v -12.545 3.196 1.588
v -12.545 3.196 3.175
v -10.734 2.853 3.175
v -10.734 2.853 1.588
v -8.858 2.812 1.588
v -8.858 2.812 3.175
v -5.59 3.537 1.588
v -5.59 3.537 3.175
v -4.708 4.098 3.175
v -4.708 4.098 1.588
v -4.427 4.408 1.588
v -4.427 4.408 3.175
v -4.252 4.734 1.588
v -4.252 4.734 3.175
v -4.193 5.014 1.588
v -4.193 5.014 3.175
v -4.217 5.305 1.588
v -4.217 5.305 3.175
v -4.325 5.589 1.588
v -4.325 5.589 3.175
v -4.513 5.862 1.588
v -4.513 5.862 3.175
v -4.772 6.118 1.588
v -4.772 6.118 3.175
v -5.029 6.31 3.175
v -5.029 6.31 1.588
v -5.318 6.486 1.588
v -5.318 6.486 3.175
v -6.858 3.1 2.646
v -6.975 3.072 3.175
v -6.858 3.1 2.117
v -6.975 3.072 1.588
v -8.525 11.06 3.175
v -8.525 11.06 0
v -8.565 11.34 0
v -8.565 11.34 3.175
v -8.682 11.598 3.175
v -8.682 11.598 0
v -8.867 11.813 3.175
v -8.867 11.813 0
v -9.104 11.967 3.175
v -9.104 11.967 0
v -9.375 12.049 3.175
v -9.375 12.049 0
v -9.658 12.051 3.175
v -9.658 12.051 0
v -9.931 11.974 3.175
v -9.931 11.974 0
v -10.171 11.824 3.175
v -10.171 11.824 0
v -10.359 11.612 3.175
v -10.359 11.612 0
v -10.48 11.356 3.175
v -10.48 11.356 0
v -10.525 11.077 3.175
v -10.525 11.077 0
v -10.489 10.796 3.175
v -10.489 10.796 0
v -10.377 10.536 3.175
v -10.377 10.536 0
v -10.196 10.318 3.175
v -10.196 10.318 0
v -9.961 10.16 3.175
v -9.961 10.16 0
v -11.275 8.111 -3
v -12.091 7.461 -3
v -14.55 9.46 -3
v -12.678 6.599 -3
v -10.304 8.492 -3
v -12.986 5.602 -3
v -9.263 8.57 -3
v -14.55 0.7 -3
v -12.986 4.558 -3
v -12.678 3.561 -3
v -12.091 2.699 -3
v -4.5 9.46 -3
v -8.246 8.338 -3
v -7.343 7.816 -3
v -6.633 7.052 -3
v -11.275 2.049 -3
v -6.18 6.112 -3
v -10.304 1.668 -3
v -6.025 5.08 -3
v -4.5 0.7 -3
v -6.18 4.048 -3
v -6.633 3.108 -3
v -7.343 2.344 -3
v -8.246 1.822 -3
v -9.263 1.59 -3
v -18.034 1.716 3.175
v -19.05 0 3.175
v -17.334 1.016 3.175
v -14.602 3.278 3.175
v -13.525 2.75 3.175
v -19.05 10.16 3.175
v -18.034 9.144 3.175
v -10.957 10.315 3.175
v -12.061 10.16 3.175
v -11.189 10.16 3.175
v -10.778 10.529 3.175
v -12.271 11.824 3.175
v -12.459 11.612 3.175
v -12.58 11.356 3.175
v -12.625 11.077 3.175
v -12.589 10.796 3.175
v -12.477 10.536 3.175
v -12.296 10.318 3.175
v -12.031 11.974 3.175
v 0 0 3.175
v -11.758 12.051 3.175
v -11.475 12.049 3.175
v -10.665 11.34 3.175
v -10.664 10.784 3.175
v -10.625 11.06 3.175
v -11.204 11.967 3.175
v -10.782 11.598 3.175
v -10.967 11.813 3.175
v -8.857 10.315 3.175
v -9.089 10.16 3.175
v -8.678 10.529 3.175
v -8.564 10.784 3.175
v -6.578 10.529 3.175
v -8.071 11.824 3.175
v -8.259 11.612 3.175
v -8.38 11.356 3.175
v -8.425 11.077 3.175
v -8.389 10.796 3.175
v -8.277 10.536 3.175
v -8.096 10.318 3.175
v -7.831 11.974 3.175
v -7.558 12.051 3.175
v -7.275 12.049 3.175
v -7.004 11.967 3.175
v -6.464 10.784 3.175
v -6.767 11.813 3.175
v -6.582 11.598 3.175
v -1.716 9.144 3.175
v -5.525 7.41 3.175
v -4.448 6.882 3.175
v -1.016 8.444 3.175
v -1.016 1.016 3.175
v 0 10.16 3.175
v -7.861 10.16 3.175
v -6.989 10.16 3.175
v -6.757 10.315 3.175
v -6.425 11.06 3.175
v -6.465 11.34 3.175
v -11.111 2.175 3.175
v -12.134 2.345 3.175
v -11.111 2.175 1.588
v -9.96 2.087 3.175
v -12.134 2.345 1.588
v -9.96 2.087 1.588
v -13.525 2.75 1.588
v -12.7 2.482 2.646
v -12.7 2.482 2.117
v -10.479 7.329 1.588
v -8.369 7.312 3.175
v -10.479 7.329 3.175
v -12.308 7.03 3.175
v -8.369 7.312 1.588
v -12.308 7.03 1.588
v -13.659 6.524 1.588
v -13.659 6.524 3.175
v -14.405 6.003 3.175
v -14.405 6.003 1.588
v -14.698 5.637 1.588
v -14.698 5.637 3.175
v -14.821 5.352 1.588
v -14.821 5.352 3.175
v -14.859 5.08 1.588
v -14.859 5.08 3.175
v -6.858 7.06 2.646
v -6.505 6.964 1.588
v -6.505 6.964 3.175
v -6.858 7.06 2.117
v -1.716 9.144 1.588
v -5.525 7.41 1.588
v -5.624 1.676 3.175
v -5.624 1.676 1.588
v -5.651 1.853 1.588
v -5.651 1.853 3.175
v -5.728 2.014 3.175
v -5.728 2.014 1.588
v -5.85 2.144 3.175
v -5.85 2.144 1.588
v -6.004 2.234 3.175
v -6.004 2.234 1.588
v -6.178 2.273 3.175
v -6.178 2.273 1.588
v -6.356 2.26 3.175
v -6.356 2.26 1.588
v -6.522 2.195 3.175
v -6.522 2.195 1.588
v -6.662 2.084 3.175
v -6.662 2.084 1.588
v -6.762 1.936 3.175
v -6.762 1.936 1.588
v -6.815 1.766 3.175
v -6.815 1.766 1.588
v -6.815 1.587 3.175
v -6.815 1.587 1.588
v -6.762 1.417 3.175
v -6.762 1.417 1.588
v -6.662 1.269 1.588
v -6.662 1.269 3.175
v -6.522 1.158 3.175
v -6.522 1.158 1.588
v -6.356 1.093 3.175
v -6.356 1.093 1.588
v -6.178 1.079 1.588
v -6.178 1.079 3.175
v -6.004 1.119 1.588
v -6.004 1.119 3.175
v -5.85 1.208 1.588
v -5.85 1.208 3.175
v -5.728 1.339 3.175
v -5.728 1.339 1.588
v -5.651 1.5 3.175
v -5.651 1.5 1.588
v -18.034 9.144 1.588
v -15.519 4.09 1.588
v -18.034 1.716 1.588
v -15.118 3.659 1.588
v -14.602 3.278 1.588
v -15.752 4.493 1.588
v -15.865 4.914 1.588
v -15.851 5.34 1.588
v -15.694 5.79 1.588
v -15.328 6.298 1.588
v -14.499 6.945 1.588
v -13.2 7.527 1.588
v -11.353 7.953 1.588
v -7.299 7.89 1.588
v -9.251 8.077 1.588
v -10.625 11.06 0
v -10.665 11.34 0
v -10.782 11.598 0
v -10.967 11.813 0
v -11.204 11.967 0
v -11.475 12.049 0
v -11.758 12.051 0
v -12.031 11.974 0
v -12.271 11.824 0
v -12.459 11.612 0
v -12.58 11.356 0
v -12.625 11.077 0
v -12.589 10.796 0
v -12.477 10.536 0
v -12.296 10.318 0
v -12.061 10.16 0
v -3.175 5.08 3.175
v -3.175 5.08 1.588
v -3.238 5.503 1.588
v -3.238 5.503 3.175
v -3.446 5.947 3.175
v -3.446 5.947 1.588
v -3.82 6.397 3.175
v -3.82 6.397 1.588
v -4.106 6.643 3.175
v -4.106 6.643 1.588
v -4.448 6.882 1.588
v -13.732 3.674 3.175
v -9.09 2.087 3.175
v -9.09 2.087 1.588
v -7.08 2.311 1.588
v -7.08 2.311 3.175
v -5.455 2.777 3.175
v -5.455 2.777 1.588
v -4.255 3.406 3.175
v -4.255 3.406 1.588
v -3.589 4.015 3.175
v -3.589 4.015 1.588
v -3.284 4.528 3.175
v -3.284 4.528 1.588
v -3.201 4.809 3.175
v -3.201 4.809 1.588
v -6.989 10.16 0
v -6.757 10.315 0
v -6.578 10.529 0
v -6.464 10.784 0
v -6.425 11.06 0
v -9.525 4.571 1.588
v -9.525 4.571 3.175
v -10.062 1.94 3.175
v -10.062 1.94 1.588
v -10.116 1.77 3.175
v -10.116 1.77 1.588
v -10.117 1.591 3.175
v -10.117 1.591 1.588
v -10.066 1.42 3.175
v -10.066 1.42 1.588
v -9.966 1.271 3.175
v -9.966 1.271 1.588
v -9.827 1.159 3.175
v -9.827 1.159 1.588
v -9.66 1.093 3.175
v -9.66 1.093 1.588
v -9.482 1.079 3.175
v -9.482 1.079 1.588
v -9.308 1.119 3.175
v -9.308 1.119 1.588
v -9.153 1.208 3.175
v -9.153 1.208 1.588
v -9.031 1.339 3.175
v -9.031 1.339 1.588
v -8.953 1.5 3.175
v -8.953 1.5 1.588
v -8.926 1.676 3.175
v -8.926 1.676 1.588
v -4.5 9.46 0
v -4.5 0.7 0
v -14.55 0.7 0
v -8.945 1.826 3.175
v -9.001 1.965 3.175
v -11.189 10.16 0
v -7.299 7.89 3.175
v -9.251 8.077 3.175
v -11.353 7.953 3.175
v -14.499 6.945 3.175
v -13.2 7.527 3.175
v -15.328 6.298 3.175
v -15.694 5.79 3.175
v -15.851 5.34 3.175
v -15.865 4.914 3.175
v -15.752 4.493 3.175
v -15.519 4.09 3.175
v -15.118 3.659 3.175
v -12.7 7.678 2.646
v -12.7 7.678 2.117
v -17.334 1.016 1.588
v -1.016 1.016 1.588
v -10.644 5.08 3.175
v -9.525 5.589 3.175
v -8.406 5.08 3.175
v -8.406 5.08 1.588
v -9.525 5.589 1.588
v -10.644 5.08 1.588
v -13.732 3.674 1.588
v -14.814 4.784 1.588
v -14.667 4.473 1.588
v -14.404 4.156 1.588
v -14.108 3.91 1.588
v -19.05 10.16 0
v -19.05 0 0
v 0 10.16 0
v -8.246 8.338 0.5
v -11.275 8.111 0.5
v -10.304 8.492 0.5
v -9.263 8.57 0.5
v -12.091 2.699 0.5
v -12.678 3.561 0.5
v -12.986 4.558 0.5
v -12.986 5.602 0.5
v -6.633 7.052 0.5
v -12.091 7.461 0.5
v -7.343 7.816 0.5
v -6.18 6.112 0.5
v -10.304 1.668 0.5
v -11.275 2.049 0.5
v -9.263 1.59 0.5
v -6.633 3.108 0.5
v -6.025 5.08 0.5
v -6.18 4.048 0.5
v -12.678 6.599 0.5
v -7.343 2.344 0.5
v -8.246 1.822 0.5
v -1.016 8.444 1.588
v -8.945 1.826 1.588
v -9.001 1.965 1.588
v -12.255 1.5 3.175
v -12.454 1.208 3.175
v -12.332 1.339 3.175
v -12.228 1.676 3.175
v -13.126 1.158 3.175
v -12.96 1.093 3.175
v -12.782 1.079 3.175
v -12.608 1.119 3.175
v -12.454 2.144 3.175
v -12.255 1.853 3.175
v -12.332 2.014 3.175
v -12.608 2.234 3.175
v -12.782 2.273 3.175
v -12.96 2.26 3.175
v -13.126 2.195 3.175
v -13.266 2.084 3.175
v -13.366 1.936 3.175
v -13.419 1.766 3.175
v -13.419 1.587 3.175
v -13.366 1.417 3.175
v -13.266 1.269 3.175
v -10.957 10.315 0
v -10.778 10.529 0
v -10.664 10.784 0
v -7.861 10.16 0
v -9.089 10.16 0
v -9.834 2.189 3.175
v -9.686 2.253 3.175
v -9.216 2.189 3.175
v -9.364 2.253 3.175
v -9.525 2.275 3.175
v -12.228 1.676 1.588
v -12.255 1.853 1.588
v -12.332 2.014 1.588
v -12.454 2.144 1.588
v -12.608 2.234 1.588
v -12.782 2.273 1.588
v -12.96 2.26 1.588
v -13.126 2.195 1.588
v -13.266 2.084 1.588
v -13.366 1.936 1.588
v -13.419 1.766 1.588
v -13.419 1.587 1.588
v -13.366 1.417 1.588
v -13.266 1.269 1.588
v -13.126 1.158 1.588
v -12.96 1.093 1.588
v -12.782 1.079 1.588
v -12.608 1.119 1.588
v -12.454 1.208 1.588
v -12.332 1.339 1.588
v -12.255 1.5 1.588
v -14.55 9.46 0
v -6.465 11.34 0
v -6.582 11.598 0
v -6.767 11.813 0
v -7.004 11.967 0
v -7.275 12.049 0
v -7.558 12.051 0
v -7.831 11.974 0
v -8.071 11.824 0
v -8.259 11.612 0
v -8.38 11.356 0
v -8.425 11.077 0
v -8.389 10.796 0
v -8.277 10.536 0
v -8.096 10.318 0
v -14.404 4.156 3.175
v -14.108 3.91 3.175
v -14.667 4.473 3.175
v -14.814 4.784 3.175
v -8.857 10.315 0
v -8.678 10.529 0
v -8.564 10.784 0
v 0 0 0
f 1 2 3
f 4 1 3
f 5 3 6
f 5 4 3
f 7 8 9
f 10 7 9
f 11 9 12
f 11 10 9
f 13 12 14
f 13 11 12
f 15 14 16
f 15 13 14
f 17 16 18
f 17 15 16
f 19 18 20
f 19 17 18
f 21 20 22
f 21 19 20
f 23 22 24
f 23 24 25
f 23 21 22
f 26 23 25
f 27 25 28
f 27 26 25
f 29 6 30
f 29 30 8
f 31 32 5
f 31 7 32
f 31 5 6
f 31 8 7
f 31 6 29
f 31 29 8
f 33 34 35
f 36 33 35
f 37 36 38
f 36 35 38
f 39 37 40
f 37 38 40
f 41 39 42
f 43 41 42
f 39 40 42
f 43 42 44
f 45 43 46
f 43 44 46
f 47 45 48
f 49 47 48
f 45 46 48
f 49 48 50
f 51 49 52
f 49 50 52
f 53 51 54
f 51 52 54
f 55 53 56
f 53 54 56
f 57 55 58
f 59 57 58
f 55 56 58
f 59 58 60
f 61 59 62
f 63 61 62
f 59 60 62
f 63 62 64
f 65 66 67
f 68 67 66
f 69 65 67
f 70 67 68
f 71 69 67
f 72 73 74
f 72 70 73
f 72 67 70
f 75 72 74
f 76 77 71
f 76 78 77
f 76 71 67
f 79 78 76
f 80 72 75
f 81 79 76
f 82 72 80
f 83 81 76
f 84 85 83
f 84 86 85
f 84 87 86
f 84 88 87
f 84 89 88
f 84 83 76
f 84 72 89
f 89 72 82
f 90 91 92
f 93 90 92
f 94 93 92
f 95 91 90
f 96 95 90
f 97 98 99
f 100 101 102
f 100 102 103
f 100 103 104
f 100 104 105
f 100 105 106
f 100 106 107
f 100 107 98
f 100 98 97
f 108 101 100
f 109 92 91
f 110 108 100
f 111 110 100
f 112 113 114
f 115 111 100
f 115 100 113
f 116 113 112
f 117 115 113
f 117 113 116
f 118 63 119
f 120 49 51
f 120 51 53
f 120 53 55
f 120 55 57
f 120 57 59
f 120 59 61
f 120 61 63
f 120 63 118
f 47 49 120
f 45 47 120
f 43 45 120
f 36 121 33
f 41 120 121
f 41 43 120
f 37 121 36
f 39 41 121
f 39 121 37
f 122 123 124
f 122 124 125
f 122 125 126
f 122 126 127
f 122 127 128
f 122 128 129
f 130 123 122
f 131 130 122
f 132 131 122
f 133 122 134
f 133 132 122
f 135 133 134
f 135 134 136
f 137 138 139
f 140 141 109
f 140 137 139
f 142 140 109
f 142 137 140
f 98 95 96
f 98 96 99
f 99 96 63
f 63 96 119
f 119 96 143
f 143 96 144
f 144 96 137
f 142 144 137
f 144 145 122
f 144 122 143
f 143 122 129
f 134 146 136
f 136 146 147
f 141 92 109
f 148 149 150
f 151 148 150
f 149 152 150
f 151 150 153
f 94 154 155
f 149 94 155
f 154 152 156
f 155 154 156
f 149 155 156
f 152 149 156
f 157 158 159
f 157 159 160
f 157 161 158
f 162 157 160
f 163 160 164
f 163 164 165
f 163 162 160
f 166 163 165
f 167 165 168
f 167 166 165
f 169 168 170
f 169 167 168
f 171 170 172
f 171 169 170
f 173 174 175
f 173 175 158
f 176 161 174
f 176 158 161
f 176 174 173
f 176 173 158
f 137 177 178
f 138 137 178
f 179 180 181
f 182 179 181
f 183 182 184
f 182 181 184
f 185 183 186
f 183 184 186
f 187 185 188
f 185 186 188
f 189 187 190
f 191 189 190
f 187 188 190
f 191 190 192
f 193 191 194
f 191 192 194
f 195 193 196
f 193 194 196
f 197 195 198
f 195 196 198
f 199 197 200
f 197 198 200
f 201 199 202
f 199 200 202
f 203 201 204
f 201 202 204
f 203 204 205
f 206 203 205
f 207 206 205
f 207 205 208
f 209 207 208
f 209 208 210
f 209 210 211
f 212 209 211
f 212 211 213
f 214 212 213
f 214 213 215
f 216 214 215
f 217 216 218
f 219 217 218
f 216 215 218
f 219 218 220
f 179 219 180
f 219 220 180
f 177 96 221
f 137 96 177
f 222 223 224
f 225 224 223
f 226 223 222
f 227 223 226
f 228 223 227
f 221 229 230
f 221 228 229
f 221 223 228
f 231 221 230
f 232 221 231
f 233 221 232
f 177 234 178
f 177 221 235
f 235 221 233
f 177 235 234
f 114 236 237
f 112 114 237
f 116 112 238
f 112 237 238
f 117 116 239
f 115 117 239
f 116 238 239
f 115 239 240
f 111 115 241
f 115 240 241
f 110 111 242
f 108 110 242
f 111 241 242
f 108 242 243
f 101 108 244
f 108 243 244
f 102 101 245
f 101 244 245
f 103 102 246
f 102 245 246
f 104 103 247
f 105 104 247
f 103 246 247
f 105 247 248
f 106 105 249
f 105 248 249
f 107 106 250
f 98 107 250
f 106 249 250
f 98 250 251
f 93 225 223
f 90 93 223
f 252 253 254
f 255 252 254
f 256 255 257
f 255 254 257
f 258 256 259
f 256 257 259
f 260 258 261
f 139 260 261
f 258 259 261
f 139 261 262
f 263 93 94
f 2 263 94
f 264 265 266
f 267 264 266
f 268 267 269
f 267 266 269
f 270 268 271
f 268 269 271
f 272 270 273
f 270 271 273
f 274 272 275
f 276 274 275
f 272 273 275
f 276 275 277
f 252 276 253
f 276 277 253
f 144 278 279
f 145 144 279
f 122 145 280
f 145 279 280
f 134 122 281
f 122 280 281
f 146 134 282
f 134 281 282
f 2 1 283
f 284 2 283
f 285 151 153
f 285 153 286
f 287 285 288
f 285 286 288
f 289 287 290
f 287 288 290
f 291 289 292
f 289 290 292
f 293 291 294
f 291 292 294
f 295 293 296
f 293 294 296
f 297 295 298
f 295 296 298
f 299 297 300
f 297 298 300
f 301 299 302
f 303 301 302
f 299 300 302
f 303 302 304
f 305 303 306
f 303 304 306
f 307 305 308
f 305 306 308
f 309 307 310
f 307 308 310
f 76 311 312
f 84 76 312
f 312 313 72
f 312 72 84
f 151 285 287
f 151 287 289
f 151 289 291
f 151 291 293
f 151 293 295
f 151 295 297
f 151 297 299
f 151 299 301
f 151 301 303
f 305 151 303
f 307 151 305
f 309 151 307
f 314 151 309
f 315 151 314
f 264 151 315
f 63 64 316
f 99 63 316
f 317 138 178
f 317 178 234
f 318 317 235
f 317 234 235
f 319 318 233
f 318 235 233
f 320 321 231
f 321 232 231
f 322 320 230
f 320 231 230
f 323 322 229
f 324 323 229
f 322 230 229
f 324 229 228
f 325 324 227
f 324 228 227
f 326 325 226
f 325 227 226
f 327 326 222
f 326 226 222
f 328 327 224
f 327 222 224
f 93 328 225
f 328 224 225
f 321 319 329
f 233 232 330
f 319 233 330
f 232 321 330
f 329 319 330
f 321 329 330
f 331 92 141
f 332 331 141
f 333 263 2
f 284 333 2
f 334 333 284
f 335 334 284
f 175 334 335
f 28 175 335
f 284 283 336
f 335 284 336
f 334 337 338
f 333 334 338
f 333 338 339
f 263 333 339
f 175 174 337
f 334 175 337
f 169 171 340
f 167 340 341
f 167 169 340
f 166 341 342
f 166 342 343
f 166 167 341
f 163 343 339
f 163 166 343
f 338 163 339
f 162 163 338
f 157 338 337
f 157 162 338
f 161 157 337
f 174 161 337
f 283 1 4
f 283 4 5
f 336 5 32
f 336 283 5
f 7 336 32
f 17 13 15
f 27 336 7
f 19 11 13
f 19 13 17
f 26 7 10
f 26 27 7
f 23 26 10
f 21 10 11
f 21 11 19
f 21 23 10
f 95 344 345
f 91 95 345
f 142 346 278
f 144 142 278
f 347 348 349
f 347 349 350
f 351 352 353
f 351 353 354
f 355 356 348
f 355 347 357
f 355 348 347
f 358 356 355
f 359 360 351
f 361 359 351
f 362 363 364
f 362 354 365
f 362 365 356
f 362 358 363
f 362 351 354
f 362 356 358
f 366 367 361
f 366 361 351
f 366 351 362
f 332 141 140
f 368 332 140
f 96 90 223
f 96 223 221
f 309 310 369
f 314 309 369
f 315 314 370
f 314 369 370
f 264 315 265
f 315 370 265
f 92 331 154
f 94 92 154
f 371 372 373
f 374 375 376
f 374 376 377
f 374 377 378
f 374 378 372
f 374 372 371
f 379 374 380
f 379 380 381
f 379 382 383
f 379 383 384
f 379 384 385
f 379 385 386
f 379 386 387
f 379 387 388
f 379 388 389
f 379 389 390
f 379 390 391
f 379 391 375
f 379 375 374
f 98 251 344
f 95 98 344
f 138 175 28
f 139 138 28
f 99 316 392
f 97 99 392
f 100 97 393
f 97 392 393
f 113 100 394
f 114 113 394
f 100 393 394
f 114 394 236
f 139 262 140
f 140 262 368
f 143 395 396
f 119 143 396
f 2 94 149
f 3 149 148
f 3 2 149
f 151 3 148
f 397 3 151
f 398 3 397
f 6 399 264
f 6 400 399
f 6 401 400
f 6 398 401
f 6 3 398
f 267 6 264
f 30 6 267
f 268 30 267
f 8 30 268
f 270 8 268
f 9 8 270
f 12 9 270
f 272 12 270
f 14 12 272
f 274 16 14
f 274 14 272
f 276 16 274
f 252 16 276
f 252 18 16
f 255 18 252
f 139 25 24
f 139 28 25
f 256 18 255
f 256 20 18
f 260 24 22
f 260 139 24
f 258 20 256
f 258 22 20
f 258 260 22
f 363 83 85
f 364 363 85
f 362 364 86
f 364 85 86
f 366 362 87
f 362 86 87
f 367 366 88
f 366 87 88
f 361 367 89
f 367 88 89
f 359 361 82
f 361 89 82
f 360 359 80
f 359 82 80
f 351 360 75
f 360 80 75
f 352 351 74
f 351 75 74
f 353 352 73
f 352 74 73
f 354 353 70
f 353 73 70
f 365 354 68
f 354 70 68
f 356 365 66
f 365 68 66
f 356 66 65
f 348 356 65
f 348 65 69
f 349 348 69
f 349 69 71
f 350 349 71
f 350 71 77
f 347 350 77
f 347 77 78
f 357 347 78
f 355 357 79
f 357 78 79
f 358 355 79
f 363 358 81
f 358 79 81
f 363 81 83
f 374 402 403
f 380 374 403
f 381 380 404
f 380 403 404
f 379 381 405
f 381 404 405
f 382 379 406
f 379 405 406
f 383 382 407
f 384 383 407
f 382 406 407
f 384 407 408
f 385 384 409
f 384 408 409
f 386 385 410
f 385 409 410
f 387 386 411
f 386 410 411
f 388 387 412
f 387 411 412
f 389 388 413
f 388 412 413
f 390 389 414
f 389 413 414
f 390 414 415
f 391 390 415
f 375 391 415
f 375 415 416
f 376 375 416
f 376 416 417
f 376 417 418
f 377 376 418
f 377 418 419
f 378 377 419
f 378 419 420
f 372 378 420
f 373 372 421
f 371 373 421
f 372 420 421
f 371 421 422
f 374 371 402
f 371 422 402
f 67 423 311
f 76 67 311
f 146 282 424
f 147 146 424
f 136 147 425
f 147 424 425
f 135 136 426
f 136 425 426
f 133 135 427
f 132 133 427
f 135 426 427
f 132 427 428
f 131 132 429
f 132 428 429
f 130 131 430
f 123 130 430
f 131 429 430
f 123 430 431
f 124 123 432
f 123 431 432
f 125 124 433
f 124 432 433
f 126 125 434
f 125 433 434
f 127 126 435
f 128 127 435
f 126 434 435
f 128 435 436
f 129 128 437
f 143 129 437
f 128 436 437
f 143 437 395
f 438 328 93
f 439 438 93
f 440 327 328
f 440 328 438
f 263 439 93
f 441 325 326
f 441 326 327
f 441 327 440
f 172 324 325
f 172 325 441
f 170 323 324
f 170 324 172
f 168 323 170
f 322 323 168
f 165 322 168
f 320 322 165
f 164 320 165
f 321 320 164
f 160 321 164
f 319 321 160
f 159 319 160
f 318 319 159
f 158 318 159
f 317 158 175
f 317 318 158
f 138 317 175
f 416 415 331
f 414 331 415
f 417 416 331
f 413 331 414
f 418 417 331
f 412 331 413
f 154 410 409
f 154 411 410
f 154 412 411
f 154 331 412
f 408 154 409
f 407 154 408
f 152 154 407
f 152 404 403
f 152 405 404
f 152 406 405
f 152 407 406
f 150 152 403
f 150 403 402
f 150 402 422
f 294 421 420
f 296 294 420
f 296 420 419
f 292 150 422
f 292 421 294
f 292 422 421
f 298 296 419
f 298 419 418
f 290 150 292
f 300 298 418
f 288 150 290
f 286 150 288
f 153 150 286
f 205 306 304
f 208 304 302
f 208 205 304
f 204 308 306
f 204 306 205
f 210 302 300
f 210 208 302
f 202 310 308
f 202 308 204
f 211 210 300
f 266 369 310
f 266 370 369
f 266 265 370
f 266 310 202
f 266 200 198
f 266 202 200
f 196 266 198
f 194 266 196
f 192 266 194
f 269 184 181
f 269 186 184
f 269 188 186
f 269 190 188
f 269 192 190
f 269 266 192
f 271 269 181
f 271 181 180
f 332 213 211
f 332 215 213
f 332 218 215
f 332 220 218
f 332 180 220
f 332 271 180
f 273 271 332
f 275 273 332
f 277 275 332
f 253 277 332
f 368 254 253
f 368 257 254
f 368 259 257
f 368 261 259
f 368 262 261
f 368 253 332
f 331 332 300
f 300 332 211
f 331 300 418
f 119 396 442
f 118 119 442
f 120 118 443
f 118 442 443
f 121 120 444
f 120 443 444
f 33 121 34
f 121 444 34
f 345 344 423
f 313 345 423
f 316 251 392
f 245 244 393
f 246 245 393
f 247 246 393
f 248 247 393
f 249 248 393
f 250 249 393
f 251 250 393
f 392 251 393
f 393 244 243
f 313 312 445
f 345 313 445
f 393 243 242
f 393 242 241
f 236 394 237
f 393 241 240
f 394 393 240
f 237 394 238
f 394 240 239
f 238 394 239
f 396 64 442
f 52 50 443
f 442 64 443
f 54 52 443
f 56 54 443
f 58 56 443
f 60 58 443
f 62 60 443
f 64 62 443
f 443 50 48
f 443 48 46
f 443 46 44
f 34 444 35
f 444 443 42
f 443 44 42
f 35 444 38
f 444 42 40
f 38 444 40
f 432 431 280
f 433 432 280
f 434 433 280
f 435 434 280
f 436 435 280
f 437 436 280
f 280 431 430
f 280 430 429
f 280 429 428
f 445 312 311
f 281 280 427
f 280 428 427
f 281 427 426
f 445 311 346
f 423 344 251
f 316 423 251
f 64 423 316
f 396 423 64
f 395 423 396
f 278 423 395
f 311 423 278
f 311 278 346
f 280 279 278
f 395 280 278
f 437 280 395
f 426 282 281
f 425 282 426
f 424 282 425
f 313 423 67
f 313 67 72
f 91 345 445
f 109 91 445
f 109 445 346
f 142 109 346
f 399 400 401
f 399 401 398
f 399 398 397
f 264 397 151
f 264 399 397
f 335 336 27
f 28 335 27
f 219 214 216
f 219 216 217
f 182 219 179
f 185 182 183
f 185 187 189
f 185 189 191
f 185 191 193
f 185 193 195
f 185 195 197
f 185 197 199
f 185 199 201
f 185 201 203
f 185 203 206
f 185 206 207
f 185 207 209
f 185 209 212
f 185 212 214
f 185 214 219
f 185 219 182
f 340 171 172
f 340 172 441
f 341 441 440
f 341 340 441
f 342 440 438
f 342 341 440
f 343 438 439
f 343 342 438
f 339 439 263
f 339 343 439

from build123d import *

# Parameters (mm, degrees)
F1_DEPTH  = 3.175
F2_W      = 17.018
F2_H      = 8.128
F3_DEPTH  = 1.5875
F5_DEPTH  = 1.5875
F7_DEPTH  = 1.5875
F8_R      = 0.598574631
F9_DEPTH  = 1.5875
F10_W     = 10.05
F10_H     = 8.76
F11_DEPTH = 3
F12_R     = 3.5
F13_DEPTH = 3.5


with BuildPart() as f1:
    # F0 (on Top) → F1 (new body)
    with BuildSketch(Plane.XY):
        with BuildLine():
            Line((-12.0608898944, 10.16), (-19.05, 10.16))
            Line((-19.05, 10.16), (-19.05, 0))
            Line((-19.05, 0), (0, 0))
            Line((0, 0), (0, 10.16))
            Line((0, 10.16), (-6.9891101056, 10.16))
            ThreePointArc((-6.9891101056, 10.16), (-7.425, 10.06), (-7.8608898944, 10.16))
            Line((-7.8608898944, 10.16), (-9.0891101056, 10.16))
            ThreePointArc((-9.0891101056, 10.16), (-9.525, 10.06), (-9.9608898944, 10.16))
            Line((-9.9608898944, 10.16), (-11.1891101056, 10.16))
            ThreePointArc((-11.1891101056, 10.16), (-11.625, 10.06), (-12.0608898944, 10.16))
        make_face()
        with BuildLine():
            ThreePointArc((-10.625, 11.06), (-12.1560885546, 11.9073163206), (-12.0608898944, 10.16))
            Line((-12.0608898944, 10.16), (-11.1891101056, 10.16))
            ThreePointArc((-11.1891101056, 10.16), (-10.7776836794, 10.5289114454), (-10.625, 11.06))
        make_face()
        with BuildLine():
            Line((-11.1891101056, 10.16), (-12.0608898944, 10.16))
            ThreePointArc((-12.0608898944, 10.16), (-11.625, 10.06), (-11.1891101056, 10.16))
        make_face()
        with BuildLine():
            ThreePointArc((-8.525, 11.06), (-10.0560885546, 11.9073163206), (-9.9608898944, 10.16))
            Line((-9.9608898944, 10.16), (-9.0891101056, 10.16))
            ThreePointArc((-9.0891101056, 10.16), (-8.6776836794, 10.5289114454), (-8.525, 11.06))
        make_face()
        with BuildLine():
            Line((-9.0891101056, 10.16), (-9.9608898944, 10.16))
            ThreePointArc((-9.9608898944, 10.16), (-9.525, 10.06), (-9.0891101056, 10.16))
        make_face()
        with BuildLine():
            ThreePointArc((-7.8608898944, 10.16), (-7.425, 10.06), (-6.9891101056, 10.16))
            Line((-6.9891101056, 10.16), (-7.8608898944, 10.16))
        make_face()
        with BuildLine():
            Line((-7.8608898944, 10.16), (-6.9891101056, 10.16))
            ThreePointArc((-6.9891101056, 10.16), (-6.5776836794, 10.5289114454), (-6.425, 11.06))
            ThreePointArc((-6.425, 11.06), (-7.9560885546, 11.9073163206), (-7.8608898944, 10.16))
        make_face()
    extrude(amount=F1_DEPTH)

    # F2 (on face) → F3 (cut)
    with BuildSketch(Plane.XY.offset(3.175)):
        with Locations((-9.525, 5.08)):
            Rectangle(F2_W, F2_H)
    extrude(amount=-F3_DEPTH, mode=Mode.SUBTRACT)

    # F4 (on face) → F5 (join, through all)
    with BuildSketch(Plane.XY.offset(1.5875)):
        Polygon((-1.716, 9.144), (-9.525, 5.5893209952), (-10.6438879914, 5.08), (-18.034, 1.716), (-18.034, 1.016), (-17.334, 1.016), (-9.525, 4.5706790048), (-8.4061120086, 5.08), (-1.016, 8.444), (-1.016, 9.144), align=None)
    extrude(amount=F5_DEPTH)

    # F6 (on face) → F7 (join, through all)
    with BuildSketch(Plane.XY.offset(1.5875)):
        with BuildLine():
            add(Edge.make_bspline(
                [(-3.175, 5.08), (-3.175, 10.2761524227), (-12.7, 7.6780762114), (-22.225, 5.08), (-12.7, 2.4819237886), (-3.175, -0.1161524227), (-3.175, 5.08)],
                knots=[0, 0, 0, 2.0943951024, 2.0943951024, 4.1887902048, 4.1887902048, 6.2831853072, 6.2831853072, 6.2831853072], degree=2, weights=[1, 0.5, 1, 0.5, 1, 0.5, 1]))
        make_face()
        with BuildLine():
            add(Edge.make_bspline(
                [(-14.859, 5.08), (-14.859, 1.1205318539), (-6.858, 3.1002659269), (1.143, 5.08), (-6.858, 7.0597340731), (-14.859, 9.0394681461), (-14.859, 5.08)],
                knots=[0, 0, 0, 2.0943951024, 2.0943951024, 4.1887902048, 4.1887902048, 6.2831853072, 6.2831853072, 6.2831853072], degree=2, weights=[1, 0.5, 1, 0.5, 1, 0.5, 1]))
        make_face(mode=Mode.SUBTRACT)
    extrude(amount=F7_DEPTH)

    # F8 (on face) → F9 (join, through all)
    with BuildSketch(Plane.XY.offset(1.5875)):
        with Locations((-12.827, 1.6764)):
            Circle(F8_R)
        with Locations((-6.223, 1.6764)):
            Circle(F8_R)
        with Locations((-9.525, 1.6764)):
            Circle(F8_R)
    extrude(amount=F9_DEPTH)

    # F10 (on face) → F11 (join)
    with BuildSketch(Plane(origin=(0, 0, 0), x_dir=(1, 0, 0), z_dir=(0, 0, -1))):
        with Locations((-9.525, -5.08)):
            Rectangle(F10_W, F10_H)
    extrude(amount=F11_DEPTH)

    # F12 (on face) → F13 (cut)
    with BuildSketch(Plane(origin=(0, 0, -3), x_dir=(1, 0, 0), z_dir=(0, 0, -1))):
        with Locations((-9.525, -5.08)):
            Circle(F12_R)
    extrude(amount=-F13_DEPTH, mode=Mode.SUBTRACT)


solid = f1.part
